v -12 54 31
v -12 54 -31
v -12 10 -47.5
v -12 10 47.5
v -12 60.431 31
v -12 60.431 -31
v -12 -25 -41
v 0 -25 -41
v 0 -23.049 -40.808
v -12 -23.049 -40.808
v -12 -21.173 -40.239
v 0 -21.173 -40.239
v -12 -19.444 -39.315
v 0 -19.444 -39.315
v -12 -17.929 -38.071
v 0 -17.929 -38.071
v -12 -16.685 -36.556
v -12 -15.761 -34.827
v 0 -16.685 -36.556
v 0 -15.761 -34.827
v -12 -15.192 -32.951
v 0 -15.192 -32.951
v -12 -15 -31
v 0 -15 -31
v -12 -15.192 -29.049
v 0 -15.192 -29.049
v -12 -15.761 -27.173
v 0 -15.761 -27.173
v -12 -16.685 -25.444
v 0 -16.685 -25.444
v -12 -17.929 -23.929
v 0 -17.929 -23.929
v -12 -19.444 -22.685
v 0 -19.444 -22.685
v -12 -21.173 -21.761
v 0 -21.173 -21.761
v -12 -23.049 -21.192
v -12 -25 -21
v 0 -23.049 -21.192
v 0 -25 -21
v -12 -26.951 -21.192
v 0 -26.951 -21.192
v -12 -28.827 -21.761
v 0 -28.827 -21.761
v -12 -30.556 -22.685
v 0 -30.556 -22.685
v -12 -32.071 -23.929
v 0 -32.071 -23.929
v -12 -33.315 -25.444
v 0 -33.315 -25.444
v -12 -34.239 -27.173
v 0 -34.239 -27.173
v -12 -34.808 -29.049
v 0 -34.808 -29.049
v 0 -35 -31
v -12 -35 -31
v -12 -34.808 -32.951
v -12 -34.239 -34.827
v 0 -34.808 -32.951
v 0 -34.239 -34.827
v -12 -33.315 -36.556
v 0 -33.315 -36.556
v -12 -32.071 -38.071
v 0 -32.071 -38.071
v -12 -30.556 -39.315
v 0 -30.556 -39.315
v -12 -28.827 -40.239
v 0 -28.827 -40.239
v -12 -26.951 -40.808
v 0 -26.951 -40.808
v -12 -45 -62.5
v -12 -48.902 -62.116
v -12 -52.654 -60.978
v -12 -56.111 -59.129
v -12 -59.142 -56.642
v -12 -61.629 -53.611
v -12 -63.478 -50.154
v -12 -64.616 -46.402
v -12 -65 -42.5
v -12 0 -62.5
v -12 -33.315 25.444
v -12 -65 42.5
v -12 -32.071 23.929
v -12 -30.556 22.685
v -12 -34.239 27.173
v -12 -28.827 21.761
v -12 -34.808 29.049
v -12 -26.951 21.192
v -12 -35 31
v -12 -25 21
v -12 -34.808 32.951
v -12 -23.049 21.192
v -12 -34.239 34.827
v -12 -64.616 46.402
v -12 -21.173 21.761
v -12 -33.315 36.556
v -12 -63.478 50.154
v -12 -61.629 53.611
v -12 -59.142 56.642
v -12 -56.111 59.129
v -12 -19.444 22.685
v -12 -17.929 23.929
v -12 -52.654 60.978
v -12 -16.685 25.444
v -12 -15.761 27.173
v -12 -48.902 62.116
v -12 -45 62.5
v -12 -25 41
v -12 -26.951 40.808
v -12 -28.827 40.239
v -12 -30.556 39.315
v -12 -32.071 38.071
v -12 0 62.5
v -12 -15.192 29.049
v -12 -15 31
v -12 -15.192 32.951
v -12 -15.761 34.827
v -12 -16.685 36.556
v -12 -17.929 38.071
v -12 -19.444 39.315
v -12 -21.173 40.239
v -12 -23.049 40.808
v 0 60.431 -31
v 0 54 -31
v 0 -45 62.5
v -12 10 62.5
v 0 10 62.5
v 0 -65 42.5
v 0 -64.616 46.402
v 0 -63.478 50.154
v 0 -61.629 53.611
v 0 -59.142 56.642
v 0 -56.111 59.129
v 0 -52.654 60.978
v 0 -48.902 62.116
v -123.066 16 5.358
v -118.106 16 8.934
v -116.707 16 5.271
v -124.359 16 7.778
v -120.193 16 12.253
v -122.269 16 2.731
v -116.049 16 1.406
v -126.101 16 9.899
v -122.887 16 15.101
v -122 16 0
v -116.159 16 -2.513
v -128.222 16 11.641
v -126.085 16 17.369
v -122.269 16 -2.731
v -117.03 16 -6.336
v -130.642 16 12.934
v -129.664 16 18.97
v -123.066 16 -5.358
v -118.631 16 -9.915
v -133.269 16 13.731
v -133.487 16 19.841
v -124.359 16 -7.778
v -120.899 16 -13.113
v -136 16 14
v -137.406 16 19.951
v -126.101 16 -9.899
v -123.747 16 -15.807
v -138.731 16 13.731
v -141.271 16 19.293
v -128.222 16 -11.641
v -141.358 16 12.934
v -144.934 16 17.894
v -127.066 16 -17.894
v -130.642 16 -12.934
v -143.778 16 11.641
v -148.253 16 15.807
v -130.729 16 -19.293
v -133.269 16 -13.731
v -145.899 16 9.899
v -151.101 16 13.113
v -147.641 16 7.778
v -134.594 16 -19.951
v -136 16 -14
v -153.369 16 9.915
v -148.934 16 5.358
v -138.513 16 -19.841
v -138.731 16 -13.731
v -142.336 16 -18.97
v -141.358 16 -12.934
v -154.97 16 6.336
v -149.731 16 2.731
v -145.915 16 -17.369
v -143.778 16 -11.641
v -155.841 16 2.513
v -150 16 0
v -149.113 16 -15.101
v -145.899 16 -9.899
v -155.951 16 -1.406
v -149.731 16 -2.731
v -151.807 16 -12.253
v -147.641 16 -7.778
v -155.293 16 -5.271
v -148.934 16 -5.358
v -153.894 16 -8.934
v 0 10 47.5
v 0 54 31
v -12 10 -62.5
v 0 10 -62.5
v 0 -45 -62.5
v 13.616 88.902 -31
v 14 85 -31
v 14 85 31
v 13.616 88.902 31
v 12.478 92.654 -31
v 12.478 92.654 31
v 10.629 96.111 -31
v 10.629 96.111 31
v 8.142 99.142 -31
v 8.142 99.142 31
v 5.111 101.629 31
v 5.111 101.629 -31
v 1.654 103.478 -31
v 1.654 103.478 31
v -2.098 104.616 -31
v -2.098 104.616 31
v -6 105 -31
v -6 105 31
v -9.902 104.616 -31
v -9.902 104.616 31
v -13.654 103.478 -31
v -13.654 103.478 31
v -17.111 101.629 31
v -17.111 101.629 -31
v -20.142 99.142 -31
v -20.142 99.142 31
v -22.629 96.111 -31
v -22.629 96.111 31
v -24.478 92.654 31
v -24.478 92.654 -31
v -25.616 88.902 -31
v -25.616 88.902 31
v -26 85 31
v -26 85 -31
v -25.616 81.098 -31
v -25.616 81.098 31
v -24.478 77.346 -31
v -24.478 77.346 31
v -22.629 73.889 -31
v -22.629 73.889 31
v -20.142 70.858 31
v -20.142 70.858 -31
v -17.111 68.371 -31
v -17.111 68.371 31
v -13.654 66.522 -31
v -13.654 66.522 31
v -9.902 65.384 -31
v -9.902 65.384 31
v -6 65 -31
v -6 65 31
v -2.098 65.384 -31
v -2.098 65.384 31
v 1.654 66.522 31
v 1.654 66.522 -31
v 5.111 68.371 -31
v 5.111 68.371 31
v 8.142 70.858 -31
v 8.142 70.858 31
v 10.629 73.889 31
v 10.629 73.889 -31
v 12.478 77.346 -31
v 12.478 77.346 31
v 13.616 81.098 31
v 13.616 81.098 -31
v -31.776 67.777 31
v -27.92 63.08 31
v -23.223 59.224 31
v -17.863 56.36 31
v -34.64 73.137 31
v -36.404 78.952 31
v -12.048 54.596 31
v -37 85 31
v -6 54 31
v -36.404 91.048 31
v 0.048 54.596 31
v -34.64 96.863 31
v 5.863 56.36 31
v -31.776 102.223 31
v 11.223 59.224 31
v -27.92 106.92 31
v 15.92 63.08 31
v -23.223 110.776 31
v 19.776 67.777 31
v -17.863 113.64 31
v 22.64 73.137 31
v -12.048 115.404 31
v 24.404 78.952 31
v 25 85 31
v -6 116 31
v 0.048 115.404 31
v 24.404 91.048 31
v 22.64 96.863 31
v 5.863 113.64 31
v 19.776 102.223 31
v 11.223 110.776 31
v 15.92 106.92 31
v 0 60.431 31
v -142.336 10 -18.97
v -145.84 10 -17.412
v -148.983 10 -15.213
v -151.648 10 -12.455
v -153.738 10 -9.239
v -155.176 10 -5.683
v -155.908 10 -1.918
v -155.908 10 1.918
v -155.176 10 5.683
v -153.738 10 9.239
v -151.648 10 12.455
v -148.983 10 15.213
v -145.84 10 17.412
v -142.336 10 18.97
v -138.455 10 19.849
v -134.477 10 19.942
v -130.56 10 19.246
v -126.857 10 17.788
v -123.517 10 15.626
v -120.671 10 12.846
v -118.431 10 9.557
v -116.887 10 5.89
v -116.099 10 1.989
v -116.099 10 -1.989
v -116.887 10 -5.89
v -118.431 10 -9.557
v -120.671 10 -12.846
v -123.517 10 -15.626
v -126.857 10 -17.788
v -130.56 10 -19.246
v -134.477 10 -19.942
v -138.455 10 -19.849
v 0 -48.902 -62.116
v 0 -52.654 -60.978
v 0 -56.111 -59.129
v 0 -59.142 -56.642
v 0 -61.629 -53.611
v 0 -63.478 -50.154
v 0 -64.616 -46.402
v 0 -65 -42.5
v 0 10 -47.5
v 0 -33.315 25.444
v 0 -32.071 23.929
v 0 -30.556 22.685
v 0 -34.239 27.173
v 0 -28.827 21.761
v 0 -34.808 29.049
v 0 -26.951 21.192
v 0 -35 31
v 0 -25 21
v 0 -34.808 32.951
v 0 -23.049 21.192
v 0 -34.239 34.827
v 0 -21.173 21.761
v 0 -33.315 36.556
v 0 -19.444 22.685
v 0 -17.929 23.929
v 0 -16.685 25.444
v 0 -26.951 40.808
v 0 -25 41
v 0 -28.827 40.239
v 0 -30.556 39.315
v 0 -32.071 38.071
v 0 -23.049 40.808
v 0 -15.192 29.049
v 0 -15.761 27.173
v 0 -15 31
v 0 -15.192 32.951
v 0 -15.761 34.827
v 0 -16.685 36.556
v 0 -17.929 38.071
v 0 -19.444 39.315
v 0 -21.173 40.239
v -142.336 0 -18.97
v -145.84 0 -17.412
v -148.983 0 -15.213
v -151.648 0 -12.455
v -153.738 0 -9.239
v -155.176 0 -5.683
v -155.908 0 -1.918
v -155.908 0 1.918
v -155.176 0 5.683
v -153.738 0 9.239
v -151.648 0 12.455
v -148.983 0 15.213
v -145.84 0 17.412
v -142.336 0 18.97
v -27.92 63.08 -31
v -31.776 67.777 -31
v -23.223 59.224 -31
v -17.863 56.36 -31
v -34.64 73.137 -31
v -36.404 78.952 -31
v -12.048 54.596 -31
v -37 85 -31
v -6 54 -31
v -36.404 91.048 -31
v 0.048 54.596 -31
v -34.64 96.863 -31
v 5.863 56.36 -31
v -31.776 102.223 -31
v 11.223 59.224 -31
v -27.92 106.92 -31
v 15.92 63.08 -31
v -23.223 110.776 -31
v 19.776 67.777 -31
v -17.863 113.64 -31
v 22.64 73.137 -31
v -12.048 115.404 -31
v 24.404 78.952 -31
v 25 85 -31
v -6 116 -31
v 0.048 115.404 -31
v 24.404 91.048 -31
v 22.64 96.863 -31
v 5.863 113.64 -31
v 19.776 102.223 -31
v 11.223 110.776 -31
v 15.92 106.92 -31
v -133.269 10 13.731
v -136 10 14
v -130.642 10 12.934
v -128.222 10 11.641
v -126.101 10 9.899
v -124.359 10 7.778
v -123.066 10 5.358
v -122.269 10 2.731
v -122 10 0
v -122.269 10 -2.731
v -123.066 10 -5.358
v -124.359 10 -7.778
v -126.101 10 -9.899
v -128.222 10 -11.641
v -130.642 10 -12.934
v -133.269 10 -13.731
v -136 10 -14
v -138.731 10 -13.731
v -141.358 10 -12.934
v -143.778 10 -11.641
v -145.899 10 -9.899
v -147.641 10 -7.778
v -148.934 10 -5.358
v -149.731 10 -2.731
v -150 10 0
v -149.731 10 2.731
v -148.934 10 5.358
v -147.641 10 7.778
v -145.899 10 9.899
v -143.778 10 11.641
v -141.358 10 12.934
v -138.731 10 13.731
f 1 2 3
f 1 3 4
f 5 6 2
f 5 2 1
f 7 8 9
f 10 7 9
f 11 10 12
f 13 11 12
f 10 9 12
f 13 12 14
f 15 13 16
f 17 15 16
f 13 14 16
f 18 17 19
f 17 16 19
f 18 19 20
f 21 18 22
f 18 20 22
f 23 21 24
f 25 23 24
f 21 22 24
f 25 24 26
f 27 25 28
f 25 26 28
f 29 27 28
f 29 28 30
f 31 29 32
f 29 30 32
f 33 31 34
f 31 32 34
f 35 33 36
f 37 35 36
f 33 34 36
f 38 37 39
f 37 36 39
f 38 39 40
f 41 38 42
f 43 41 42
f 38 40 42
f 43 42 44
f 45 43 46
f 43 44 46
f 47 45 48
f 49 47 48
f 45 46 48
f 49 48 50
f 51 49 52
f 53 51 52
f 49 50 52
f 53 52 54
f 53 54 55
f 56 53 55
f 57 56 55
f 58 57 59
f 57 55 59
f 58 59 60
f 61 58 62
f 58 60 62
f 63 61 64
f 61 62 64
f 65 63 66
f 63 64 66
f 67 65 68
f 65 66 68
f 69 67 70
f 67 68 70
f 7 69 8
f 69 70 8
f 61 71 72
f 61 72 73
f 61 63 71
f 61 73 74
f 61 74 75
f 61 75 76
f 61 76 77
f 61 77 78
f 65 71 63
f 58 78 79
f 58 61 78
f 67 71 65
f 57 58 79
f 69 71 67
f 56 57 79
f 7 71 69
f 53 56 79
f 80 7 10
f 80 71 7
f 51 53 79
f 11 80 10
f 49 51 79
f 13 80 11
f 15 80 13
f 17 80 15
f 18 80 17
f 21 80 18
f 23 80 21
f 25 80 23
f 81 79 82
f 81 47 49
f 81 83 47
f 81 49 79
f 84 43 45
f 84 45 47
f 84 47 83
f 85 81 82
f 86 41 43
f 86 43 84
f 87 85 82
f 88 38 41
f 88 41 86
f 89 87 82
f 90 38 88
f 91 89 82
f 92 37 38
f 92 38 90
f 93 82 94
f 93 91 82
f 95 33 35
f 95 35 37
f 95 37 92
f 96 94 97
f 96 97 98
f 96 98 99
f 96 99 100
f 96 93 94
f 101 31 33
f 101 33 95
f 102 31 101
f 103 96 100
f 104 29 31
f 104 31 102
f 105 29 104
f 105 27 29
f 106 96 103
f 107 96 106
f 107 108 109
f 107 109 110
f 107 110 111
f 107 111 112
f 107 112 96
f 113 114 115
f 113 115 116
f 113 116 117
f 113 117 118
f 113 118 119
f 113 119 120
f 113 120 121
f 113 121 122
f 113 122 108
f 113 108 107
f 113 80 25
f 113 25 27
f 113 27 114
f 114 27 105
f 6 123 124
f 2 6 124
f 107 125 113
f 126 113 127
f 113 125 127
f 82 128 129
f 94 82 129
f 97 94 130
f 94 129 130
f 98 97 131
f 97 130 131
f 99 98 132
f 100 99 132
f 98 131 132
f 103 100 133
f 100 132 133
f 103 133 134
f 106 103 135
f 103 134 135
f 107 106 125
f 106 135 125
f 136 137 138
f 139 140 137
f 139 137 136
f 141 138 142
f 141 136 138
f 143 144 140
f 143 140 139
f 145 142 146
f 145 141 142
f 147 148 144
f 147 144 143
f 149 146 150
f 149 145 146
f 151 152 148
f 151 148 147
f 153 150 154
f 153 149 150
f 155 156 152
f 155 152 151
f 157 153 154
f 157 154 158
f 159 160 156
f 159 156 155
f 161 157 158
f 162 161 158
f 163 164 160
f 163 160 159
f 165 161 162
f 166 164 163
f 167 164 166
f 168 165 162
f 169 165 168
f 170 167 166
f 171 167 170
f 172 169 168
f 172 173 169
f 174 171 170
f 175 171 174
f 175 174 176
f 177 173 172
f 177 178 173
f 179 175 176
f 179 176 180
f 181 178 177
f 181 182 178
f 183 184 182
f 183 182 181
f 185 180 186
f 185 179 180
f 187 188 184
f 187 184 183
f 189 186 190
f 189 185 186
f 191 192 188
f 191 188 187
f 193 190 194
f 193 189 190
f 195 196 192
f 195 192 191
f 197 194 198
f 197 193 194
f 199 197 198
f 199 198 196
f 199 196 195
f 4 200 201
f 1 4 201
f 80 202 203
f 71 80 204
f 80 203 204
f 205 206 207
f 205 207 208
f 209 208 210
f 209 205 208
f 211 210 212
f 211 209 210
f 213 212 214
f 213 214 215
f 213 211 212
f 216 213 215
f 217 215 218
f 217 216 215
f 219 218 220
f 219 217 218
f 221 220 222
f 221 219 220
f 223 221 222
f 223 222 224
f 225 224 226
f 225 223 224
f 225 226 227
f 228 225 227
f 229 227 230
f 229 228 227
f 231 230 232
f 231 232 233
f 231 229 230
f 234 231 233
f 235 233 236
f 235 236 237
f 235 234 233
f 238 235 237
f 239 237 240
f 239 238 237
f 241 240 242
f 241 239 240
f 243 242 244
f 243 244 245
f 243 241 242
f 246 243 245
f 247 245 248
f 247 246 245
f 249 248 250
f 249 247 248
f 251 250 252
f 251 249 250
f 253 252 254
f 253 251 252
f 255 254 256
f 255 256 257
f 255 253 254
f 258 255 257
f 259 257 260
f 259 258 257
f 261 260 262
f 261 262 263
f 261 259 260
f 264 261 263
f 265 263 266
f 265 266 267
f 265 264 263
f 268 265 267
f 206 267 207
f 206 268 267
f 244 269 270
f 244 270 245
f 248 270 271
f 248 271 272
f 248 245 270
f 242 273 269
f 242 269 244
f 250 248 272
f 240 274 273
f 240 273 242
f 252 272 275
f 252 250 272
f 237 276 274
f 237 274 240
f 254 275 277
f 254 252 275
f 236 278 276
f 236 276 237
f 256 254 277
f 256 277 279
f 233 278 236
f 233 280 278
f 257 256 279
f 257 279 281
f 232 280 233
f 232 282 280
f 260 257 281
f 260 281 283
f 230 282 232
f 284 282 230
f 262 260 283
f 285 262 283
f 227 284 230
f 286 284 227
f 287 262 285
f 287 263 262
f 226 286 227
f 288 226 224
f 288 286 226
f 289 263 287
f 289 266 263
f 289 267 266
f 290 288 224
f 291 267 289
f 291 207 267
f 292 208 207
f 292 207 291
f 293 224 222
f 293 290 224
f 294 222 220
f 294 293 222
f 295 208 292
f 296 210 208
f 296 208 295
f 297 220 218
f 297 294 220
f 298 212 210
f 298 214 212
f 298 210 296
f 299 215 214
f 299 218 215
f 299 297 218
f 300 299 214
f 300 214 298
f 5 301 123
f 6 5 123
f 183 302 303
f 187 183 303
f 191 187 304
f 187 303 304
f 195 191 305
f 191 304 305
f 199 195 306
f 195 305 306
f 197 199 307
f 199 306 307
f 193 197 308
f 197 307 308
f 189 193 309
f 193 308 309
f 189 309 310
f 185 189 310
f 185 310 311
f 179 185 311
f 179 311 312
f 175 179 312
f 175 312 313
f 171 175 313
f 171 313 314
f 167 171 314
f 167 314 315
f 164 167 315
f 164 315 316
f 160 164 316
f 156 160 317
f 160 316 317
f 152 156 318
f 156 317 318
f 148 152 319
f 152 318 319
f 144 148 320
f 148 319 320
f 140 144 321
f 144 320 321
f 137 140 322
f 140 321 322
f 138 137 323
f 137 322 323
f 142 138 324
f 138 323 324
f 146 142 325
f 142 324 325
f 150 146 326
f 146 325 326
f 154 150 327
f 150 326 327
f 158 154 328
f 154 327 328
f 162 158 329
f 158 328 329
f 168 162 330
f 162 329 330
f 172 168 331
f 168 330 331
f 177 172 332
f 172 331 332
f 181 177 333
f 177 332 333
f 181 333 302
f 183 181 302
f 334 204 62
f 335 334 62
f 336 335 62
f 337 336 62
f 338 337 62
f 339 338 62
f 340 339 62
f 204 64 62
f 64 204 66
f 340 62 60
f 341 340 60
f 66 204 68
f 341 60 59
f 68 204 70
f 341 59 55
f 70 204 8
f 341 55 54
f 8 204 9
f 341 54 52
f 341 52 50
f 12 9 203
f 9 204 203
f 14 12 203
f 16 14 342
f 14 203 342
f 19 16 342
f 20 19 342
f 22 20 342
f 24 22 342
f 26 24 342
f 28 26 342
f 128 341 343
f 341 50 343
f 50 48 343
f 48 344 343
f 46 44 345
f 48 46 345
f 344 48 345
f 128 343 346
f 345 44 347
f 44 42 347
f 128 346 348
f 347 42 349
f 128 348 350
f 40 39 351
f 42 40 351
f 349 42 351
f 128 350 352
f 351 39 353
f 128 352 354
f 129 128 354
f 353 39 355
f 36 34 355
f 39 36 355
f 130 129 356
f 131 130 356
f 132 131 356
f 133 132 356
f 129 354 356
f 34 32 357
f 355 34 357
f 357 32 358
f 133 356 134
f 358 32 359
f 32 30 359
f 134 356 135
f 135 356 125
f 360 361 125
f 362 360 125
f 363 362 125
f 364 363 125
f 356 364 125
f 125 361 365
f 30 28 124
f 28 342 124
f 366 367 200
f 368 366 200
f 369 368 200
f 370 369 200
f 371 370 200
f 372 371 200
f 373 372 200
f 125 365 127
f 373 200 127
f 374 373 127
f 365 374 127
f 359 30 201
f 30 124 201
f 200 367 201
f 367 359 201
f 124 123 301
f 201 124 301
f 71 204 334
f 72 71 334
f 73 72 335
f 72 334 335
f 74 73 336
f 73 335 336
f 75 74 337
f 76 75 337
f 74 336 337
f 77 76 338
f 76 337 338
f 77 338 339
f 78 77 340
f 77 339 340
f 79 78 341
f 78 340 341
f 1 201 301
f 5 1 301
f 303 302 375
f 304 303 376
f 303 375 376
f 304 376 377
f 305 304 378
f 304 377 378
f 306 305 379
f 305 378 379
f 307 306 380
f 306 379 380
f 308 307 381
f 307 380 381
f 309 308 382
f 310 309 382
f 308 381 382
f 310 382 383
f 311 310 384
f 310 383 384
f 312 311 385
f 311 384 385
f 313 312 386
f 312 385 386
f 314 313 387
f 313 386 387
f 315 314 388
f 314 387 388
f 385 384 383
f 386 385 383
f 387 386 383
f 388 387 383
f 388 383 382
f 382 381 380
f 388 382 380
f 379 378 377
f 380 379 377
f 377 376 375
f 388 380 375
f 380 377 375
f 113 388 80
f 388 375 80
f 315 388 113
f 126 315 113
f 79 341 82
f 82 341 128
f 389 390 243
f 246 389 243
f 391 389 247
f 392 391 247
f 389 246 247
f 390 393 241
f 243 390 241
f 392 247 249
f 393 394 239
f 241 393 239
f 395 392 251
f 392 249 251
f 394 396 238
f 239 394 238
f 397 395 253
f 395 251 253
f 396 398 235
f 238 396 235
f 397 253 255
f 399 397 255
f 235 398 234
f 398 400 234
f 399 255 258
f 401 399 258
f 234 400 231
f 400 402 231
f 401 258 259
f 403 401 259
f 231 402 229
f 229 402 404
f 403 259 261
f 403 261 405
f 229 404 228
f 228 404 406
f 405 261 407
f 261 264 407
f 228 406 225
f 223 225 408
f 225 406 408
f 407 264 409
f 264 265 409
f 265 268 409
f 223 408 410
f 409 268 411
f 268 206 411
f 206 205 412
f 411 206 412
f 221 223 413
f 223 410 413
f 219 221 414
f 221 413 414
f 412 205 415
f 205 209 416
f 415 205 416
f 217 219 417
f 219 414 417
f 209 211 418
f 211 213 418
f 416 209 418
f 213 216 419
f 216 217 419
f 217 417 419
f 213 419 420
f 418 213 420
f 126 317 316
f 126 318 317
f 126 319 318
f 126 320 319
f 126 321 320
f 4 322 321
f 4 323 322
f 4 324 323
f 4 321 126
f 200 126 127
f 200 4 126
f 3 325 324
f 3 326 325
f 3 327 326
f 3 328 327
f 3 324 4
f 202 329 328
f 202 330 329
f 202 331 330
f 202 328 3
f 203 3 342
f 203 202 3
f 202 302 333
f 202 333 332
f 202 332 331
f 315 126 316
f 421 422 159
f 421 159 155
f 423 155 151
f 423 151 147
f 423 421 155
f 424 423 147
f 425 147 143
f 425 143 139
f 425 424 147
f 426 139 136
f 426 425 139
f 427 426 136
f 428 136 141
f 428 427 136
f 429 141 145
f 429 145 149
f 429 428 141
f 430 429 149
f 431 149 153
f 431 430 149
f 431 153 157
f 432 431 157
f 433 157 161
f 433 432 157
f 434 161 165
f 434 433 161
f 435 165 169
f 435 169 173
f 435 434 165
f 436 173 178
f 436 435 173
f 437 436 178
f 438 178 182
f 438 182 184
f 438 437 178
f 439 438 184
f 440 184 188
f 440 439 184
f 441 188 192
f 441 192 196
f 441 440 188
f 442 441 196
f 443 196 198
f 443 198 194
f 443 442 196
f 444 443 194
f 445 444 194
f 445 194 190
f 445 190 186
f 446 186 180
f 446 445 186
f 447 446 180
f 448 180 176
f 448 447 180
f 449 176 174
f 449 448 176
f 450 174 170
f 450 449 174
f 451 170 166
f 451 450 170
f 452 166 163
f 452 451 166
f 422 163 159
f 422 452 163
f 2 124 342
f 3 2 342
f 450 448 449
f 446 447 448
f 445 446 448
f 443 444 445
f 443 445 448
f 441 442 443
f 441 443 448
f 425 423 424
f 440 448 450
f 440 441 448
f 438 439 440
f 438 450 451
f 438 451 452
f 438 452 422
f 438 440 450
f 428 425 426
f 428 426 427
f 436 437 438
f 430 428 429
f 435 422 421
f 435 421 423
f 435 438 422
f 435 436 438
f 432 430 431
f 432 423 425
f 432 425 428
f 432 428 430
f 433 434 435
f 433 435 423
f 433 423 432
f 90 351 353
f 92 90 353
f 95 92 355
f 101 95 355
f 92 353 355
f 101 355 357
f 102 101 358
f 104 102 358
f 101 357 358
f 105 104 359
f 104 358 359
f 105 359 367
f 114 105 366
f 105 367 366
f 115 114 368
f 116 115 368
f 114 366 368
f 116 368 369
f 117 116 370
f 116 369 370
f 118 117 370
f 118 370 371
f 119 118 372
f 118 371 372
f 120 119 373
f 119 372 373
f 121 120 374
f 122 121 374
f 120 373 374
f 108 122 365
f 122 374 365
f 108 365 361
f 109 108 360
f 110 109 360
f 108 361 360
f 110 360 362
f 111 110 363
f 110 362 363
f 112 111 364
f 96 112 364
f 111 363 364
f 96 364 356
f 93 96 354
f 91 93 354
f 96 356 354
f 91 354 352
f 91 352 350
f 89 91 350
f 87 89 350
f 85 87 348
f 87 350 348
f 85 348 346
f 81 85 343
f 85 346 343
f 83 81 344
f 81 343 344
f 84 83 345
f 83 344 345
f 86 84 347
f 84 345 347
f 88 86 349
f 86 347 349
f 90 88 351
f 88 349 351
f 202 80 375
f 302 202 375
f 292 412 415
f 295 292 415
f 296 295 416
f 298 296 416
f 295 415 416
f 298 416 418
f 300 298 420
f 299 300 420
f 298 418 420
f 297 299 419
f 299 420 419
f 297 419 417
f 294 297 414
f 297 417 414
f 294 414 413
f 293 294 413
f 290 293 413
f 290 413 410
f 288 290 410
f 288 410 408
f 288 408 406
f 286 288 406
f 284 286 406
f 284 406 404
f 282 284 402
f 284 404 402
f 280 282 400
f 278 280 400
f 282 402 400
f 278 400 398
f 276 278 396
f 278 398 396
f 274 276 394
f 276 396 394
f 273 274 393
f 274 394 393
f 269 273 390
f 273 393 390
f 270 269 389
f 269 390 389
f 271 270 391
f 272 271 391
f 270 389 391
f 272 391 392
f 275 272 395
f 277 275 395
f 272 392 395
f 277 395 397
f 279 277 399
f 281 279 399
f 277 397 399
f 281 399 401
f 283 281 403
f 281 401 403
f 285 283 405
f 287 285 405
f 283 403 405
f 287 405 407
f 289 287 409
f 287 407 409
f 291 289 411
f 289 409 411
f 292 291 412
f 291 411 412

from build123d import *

# Parameters (mm, degrees)
BOSS_EXTRUDE1_DEPTH      = 10
SKETCH3_R                = 20
SKETCH3_R_2              = 14
BOSS_EXTRUDE3_DEPTH      = 6
BOSS_EXTRUDE4_DEPTH      = 31
BOSS_EXTRUDE4_DEPTH_BACK = 31
SKETCH7_R                = 31
SKETCH7_R_2              = 20
BOSS_EXTRUDE5_DEPTH      = 12
BOSS_EXTRUDE6_DEPTH      = 12
SKETCH10_R               = 10
BOSS_EXTRUDE7_DEPTH      = 12
SKETCH10_4_R             = 10
CUT_EXTRUDE2_DEPTH       = 12


with BuildPart() as part:
    # Sketch2 → Boss-Extrude1 (new body)
    with BuildSketch(Plane(origin=(0, 0, 0), x_dir=(1, 0, 0), z_dir=(0, 1, 0))):
        with BuildLine():
            Line((0, 0), (0, 62.5))
            Line((0, 62.5), (-12, 62.5))
            Line((-12, 62.5), (-142.335664896, 18.969959154))
            ThreePointArc((-142.335664896, 18.969959154), (-156, 0), (-142.335664896, -18.969959154))
            Line((-142.335664896, -18.969959154), (-12, -62.5))
            Line((-12, -62.5), (0, -62.5))
            Line((0, -62.5), (0, 0))
        make_face()
    extrude(amount=BOSS_EXTRUDE1_DEPTH)

    # Sketch3 → Boss-Extrude3 (add)
    with BuildSketch(Plane(origin=(0, 10, 0), x_dir=(1, 0, 0), z_dir=(0, 1, 0))):
        with Locations((-136, 0)):
            Circle(SKETCH3_R)
        with Locations((-136, 0)):
            Circle(SKETCH3_R_2, mode=Mode.SUBTRACT)
    extrude(amount=BOSS_EXTRUDE3_DEPTH)

    # Sketch8 → Boss-Extrude5 (add)
    with BuildSketch(Plane(origin=(0, 0, 0), x_dir=(0, 0, -1), z_dir=(1, 0, 0))):
        Polygon((-47.5, 10), (-31, 54), (-31, 60.431012935), (31, 60.431012935), (31, 54), (47.5, 10), align=None)
    extrude(amount=-BOSS_EXTRUDE5_DEPTH)

    # Sketch9 → Boss-Extrude6 (add)
    with BuildSketch(Plane(origin=(0, 0, 0), x_dir=(0, 0, -1), z_dir=(1, 0, 0))):
        with BuildLine():
            Line((-62.5, 0), (62.5, 0))
            Line((62.5, 0), (62.5, -45))
            ThreePointArc((62.5, -45), (56.642135624, -59.142135624), (42.5, -65))
            Line((42.5, -65), (-42.5, -65))
            ThreePointArc((-42.5, -65), (-56.642135624, -59.142135624), (-62.5, -45))
            Line((-62.5, -45), (-62.5, 0))
        make_face()
    extrude(amount=-BOSS_EXTRUDE6_DEPTH)

    # Sketch10 → Boss-Extrude7 (add)
    with BuildSketch(Plane(origin=(0, 0, 0), x_dir=(0, 0, -1), z_dir=(1, 0, 0))):
        with Locations((-31, -25)):
            Circle(SKETCH10_R)
        with Locations((31, -25)):
            Circle(SKETCH10_R)
    extrude(amount=-BOSS_EXTRUDE7_DEPTH)

    # Sketch10<4> → Cut-Extrude2 (cut)
    with BuildSketch(Plane(origin=(0, 0, 0), x_dir=(0, 0, -1), z_dir=(1, 0, 0))):
        with Locations((-31, -25)):
            Circle(SKETCH10_4_R)
        with Locations((31, -25)):
            Circle(SKETCH10_4_R)
    extrude(amount=-CUT_EXTRUDE2_DEPTH, mode=Mode.SUBTRACT)


with BuildPart() as body_2:
    # Sketch7 → Boss-Extrude4 (new, two sides: drawn at the far end of the back side and taken through both)
    with BuildSketch(Plane.XY.offset(-BOSS_EXTRUDE4_DEPTH_BACK)):
        with Locations((-6, 85)):
            Circle(SKETCH7_R)
        with Locations((-6, 85)):
            Circle(SKETCH7_R_2, mode=Mode.SUBTRACT)
    extrude(amount=BOSS_EXTRUDE4_DEPTH + BOSS_EXTRUDE4_DEPTH_BACK)


solid = Compound([part.part, body_2.part])
